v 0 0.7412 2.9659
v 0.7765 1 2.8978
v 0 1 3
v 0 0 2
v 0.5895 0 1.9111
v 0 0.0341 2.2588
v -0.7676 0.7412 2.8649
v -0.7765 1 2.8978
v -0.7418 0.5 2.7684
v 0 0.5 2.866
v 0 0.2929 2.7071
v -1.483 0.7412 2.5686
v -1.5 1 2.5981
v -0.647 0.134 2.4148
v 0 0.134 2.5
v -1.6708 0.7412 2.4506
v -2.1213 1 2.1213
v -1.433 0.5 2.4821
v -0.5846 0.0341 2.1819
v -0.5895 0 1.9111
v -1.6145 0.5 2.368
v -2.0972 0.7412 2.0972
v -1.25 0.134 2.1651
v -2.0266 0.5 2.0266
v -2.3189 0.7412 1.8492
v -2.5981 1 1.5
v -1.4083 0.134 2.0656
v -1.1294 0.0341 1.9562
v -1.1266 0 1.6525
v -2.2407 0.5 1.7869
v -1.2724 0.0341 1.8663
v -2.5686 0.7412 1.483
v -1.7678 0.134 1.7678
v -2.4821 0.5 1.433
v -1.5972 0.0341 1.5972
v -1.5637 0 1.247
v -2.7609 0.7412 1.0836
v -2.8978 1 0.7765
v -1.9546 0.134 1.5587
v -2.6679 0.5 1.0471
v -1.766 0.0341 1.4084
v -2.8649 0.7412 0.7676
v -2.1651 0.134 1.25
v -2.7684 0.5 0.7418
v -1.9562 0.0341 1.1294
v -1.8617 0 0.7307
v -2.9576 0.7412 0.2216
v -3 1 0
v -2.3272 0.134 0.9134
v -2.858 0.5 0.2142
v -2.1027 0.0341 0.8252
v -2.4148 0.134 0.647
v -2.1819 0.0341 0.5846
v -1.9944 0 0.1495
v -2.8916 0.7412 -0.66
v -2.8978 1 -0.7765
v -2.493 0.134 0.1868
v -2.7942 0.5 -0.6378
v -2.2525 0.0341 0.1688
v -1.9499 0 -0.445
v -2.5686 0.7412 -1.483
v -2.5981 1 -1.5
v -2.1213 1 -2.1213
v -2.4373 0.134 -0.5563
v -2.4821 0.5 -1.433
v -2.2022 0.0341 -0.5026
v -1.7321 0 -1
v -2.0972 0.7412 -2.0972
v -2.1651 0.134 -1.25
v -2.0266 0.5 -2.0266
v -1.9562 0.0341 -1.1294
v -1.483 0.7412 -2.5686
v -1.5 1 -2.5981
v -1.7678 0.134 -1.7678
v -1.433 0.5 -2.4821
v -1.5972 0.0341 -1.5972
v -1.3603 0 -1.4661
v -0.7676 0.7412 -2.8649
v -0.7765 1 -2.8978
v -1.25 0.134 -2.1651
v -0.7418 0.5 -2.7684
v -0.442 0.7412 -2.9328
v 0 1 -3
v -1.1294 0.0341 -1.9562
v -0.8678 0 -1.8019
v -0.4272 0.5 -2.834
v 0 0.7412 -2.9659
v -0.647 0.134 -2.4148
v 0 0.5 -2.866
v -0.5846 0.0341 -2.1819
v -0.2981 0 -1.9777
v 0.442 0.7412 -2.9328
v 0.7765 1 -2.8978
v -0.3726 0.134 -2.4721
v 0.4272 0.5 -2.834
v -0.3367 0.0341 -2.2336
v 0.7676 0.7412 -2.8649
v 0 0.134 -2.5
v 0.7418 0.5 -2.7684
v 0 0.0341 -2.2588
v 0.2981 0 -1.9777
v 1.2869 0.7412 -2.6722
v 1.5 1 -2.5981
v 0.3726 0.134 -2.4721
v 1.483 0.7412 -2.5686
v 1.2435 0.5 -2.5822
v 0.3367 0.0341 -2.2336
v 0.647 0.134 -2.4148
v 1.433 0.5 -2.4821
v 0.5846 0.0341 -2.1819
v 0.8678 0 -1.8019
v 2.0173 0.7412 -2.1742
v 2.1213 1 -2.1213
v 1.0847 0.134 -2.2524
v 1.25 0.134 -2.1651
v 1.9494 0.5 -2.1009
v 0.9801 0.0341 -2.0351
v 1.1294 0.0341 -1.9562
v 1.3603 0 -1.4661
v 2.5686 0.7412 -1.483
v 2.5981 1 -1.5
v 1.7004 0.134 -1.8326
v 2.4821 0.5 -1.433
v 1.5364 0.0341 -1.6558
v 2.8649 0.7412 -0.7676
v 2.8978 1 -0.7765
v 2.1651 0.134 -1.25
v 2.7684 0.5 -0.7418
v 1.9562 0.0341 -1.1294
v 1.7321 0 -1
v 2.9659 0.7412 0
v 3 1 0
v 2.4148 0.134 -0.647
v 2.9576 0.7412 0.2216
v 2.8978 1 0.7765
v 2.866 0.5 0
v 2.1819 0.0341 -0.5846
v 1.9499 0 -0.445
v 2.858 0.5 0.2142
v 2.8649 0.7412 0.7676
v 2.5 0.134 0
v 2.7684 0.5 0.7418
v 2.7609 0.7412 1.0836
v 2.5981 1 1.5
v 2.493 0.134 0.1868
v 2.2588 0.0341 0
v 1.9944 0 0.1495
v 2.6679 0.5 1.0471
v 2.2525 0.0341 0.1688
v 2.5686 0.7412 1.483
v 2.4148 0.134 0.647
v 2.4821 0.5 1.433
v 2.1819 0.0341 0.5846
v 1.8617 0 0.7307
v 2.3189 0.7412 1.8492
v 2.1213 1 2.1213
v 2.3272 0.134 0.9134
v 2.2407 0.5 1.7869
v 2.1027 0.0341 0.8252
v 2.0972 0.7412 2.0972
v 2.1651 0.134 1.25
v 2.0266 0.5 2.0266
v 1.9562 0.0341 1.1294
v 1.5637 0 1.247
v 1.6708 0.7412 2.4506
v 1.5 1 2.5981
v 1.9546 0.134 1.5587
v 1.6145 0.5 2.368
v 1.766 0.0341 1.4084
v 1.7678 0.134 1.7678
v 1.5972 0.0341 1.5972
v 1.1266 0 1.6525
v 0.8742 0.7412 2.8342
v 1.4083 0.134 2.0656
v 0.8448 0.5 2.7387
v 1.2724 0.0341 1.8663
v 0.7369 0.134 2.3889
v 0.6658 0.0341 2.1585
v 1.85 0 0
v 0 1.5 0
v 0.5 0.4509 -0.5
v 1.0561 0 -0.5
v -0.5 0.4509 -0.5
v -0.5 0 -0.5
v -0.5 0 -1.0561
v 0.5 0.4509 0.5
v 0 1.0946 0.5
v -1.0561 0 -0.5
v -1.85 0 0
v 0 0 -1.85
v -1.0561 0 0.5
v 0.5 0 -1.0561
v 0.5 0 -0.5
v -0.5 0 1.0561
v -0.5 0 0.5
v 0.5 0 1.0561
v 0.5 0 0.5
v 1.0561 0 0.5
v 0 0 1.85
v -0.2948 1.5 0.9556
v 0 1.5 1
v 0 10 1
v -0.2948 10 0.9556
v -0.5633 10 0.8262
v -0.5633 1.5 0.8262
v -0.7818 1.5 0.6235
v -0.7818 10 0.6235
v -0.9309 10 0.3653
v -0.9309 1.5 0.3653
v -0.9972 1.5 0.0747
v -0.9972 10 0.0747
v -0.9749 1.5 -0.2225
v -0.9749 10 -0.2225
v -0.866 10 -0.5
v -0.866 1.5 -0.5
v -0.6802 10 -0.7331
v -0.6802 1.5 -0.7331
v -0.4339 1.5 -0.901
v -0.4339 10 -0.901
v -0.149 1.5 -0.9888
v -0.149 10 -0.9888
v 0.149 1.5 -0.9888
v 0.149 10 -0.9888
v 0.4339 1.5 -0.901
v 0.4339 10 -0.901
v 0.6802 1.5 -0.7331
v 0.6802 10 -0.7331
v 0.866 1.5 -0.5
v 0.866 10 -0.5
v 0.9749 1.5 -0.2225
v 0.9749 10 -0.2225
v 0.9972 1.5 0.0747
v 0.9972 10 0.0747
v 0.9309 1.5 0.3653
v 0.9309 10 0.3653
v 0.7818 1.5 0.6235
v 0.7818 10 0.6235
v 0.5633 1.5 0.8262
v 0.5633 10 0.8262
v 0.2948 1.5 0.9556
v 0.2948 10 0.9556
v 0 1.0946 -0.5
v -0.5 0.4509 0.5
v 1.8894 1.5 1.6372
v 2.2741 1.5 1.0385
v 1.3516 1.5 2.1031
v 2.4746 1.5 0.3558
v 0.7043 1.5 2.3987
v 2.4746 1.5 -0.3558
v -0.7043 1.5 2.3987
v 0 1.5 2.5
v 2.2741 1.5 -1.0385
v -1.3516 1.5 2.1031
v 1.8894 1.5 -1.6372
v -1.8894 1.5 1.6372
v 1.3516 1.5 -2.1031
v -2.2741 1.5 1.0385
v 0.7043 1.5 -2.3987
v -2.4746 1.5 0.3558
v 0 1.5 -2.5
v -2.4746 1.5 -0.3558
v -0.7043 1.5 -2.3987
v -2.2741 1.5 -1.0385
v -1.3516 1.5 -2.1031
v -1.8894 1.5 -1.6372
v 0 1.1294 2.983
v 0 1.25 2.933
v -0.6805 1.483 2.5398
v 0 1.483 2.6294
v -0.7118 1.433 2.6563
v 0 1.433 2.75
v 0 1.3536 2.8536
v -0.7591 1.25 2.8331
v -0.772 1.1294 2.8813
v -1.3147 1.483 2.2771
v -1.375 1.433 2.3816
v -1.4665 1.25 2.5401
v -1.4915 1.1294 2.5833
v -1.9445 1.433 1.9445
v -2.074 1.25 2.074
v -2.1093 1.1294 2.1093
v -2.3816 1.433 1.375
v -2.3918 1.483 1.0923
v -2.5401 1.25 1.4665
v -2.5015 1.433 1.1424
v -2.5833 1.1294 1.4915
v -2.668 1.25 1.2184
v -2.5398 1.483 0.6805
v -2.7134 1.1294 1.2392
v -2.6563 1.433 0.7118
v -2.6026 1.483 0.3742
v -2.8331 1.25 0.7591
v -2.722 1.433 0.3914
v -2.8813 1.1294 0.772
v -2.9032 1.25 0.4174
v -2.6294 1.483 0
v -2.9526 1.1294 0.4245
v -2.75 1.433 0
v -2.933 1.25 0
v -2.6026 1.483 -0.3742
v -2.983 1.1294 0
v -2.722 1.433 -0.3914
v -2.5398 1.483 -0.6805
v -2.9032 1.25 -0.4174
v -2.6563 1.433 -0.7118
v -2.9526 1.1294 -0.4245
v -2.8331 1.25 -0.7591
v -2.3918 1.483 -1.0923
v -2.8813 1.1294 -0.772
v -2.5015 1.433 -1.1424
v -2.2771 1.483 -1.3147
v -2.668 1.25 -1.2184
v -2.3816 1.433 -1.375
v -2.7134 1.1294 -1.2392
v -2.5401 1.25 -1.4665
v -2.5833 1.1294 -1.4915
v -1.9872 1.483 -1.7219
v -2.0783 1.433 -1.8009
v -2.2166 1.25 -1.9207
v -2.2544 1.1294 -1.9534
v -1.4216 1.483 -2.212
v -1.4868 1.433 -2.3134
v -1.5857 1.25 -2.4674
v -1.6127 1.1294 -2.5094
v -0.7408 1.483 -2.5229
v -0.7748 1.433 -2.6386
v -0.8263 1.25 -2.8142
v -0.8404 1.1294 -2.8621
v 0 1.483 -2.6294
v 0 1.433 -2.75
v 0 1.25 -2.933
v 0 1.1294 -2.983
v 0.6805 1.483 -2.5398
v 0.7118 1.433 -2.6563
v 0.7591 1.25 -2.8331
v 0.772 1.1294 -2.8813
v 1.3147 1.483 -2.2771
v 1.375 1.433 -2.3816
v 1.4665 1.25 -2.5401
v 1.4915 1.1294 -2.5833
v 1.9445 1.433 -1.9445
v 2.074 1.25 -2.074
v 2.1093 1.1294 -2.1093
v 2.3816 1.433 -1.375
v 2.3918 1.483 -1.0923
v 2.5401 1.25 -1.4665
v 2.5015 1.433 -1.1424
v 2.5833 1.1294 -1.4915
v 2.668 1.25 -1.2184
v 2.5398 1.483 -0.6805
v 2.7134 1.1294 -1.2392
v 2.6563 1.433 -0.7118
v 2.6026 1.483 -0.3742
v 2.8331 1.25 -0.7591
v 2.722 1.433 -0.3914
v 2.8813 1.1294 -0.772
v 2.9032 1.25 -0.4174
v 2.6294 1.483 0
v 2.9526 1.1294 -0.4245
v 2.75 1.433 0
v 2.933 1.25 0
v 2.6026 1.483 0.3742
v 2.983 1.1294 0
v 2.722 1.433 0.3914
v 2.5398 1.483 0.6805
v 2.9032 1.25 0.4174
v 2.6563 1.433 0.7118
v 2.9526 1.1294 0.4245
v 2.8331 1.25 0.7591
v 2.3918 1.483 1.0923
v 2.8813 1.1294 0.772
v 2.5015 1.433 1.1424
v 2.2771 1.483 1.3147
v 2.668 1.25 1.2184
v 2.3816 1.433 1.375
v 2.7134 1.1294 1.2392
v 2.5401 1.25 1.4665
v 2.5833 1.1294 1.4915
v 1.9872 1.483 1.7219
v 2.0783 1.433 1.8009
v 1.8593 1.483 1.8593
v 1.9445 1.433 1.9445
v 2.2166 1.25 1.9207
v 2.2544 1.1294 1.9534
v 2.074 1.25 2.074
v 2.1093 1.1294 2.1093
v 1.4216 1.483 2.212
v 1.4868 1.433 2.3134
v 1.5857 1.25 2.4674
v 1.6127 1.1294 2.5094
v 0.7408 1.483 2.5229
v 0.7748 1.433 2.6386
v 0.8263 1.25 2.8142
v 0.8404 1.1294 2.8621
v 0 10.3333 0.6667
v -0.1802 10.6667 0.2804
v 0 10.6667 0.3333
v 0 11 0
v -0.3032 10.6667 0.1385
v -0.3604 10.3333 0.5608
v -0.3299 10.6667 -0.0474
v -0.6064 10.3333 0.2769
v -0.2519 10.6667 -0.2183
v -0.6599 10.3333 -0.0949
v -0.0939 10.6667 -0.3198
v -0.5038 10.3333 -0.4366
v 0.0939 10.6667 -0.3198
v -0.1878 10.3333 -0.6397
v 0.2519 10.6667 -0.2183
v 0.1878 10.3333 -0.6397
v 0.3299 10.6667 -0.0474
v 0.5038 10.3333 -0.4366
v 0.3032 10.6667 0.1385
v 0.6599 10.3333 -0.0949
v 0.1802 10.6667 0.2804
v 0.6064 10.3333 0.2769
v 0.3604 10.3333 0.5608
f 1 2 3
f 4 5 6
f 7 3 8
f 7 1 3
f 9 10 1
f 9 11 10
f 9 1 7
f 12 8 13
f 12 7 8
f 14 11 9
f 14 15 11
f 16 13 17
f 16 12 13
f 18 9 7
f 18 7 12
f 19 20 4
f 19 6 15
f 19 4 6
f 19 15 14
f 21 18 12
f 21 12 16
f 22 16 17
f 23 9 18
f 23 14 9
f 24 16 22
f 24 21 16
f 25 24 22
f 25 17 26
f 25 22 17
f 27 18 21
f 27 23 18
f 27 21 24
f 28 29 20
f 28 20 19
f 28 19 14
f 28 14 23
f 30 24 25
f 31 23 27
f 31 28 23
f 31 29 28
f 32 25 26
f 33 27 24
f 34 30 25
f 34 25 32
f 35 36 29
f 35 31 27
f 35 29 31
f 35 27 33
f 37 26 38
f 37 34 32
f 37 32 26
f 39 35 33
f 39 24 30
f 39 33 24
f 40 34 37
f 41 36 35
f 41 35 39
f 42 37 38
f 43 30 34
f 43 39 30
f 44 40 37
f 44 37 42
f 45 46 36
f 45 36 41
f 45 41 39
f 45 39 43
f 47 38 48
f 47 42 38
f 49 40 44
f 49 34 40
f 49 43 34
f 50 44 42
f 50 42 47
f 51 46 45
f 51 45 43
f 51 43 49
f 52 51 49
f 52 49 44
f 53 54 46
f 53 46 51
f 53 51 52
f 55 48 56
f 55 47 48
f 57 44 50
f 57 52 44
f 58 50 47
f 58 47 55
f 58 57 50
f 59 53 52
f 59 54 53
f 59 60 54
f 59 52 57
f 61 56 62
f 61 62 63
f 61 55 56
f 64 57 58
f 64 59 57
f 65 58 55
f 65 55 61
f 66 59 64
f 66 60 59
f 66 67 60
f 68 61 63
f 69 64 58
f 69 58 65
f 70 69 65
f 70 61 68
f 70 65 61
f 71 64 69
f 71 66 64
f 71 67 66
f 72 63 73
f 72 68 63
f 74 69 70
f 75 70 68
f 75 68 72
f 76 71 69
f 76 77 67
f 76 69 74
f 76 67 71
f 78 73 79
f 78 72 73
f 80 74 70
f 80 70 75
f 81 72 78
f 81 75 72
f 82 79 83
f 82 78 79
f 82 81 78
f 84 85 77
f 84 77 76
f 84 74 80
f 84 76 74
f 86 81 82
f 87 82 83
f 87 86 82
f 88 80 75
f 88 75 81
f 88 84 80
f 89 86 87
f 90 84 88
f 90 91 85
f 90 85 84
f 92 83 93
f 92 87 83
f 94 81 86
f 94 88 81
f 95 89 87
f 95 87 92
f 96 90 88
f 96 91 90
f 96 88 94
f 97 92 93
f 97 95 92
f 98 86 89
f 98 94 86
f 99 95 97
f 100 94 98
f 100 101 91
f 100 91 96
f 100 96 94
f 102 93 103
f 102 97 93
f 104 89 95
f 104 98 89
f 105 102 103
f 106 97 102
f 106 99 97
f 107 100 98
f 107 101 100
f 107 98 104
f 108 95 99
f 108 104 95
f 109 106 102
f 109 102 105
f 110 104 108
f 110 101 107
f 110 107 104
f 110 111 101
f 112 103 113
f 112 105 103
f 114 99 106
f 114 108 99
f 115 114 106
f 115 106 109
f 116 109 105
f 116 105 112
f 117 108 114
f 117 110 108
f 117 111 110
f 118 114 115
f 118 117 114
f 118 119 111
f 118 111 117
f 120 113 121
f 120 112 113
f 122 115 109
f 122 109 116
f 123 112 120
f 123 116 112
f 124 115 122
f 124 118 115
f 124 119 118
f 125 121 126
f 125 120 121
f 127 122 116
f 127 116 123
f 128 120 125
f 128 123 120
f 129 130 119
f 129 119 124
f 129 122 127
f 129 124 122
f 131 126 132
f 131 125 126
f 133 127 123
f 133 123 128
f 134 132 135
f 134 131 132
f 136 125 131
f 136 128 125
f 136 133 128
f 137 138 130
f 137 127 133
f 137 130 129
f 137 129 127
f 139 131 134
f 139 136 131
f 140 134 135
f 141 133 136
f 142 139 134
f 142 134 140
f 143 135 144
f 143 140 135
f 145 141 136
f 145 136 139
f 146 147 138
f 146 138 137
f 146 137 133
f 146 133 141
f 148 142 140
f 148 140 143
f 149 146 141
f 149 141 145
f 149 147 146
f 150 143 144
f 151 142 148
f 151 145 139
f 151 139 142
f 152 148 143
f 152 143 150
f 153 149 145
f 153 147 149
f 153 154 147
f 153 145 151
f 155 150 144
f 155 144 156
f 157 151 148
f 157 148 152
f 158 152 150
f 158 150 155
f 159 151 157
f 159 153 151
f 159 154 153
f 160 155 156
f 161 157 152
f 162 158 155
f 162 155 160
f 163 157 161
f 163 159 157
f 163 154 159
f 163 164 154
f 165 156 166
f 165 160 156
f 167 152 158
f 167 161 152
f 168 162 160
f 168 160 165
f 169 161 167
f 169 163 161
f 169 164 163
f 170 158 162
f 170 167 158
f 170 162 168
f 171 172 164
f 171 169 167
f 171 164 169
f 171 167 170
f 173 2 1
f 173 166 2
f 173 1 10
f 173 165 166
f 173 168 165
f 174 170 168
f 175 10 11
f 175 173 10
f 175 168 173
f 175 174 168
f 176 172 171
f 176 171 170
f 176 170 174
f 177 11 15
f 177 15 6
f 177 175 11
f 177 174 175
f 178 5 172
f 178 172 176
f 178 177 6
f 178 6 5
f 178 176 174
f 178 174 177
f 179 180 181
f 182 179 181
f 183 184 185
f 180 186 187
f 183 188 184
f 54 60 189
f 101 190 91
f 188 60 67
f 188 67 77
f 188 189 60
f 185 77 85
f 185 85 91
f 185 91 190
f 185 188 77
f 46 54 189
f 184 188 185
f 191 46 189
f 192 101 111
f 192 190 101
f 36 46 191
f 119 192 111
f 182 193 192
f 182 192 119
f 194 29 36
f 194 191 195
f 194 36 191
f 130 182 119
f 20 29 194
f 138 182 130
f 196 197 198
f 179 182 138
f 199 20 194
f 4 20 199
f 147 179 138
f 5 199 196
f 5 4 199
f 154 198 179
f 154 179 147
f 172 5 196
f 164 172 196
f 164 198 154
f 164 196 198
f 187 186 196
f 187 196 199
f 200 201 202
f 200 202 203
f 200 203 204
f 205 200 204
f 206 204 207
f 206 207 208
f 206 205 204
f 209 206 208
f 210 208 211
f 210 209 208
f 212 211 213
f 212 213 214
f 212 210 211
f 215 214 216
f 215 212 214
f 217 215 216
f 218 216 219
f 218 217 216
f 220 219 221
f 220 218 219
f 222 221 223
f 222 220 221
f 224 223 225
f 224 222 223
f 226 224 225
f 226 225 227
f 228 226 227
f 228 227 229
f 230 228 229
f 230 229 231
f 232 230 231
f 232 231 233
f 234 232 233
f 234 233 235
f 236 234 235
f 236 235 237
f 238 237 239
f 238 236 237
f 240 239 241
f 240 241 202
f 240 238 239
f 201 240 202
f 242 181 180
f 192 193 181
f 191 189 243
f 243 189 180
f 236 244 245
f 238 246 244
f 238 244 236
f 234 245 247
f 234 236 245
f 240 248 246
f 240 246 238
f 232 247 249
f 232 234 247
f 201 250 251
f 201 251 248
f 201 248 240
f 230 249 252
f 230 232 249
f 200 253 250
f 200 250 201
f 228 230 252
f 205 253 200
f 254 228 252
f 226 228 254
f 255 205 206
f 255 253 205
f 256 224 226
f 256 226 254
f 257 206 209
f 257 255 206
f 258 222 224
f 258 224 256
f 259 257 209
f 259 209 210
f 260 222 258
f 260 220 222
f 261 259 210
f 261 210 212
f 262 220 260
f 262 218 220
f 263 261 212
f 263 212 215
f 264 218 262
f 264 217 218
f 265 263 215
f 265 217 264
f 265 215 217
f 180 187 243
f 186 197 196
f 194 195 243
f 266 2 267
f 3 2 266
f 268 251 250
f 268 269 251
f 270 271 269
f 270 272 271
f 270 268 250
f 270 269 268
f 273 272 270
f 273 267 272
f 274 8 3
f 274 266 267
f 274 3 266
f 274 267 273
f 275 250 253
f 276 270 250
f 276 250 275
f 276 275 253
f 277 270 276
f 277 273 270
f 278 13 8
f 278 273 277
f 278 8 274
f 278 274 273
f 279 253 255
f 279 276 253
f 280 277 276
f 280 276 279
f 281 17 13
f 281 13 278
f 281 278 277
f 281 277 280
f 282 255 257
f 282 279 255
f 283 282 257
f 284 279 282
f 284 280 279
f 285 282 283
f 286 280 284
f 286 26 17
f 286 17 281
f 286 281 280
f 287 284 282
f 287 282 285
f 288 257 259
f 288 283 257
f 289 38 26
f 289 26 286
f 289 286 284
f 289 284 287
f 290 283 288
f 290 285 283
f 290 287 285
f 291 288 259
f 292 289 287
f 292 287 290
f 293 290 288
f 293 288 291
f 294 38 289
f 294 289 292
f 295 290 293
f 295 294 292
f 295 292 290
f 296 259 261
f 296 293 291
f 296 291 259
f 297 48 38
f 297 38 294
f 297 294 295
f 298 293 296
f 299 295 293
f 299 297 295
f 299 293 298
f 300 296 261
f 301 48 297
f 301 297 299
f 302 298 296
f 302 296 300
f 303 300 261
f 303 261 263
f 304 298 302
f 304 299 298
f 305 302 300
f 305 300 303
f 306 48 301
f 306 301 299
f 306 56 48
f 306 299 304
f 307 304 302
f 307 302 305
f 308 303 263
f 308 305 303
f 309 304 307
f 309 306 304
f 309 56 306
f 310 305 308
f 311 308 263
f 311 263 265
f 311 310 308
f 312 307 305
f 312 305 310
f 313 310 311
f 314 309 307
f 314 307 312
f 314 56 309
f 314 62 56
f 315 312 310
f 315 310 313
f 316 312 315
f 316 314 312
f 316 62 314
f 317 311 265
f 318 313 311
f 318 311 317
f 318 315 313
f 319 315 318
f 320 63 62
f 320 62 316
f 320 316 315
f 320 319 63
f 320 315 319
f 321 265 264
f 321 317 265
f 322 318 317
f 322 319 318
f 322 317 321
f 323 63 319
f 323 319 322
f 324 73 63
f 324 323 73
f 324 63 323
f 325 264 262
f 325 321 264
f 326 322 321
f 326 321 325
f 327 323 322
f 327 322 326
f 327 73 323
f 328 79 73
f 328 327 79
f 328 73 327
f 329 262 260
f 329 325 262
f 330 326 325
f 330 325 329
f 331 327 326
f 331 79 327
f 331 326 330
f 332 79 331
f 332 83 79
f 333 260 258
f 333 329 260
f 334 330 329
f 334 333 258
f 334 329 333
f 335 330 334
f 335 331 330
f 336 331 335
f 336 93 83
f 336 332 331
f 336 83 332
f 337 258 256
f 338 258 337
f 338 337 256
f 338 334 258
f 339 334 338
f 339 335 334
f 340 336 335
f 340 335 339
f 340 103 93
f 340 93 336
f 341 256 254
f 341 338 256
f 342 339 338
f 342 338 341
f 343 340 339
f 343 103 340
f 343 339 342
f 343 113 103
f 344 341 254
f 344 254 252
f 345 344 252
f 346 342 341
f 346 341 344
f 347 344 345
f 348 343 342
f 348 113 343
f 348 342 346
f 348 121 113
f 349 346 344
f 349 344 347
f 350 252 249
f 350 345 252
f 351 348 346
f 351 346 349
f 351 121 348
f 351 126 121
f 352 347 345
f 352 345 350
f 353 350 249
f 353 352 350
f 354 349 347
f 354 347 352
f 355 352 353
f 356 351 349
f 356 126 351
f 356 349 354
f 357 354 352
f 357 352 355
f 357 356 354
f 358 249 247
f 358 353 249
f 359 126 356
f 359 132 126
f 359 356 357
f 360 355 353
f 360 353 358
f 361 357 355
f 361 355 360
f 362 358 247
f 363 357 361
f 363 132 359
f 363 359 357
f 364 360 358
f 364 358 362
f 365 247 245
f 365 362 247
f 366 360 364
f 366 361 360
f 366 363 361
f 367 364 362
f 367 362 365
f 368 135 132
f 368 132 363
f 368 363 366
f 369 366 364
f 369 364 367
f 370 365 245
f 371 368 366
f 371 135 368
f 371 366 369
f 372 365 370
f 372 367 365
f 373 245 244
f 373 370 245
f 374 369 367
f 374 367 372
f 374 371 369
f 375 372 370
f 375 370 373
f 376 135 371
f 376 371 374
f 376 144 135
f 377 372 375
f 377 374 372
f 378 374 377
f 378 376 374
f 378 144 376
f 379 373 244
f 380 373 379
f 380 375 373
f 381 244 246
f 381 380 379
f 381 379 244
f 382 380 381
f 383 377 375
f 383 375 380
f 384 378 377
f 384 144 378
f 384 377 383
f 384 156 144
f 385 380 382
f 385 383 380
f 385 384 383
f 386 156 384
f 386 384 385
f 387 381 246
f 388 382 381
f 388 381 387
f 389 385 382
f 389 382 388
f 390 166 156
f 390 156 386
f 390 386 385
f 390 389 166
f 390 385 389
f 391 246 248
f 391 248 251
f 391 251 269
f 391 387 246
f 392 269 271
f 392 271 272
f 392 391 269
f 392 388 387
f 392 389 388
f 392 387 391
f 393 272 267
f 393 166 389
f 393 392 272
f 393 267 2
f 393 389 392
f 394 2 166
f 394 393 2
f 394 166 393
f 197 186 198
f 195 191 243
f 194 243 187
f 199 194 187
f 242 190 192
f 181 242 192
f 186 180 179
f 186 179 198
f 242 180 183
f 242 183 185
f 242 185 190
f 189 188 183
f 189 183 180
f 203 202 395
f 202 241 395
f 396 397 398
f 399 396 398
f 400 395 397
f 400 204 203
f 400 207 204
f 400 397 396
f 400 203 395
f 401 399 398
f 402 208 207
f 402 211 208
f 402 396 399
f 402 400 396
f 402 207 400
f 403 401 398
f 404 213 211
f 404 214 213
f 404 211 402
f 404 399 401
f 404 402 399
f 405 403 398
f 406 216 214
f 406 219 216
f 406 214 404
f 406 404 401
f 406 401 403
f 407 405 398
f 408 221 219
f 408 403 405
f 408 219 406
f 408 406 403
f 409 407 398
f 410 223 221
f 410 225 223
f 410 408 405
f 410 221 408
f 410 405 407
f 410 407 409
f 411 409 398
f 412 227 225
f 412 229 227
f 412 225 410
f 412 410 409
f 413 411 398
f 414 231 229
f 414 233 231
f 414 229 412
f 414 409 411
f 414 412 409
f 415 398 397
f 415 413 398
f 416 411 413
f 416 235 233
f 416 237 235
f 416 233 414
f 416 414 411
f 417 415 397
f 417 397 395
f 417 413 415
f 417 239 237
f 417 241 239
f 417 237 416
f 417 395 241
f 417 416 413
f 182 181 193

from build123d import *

# Parameters (mm, degrees)
F2_SIZE      = 1
F4_DEPTH     = 0.5
F5_T4_DEPTH  = 4.9533840607
F5_T10_DEPTH = 4.9533840607
F5_T16_DEPTH = 4.9533840607
F5_T22_DEPTH = 4.9533840607
F7_DEPTH     = 0.5
F8_T4_DEPTH  = 4.9533840607
F8_T10_DEPTH = 4.9533840607
F8_T16_DEPTH = 4.9533840607
F8_T22_DEPTH = 4.9533840607
F8_T28_DEPTH = 4.9533840607
F8_T34_DEPTH = 4.9533840607
F8_T40_DEPTH = 4.9533840607
F8_T46_DEPTH = 4.9533840607


# Not quite as in the source:
# - a fillet or chamfer that OpenCascade refuses, or shapes differently, is made with other operations: its cross-section is extruded or revolved along the edge and cut away or added


with BuildPart() as f1:
    # F0 (on Right) → F1 (revolve)
    with BuildSketch(Plane.YZ):
        with BuildLine():
            Line((0, 2), (0, 0))
            Line((0, 0), (11, 0))
            Line((11, 0), (11, 1))
            Line((11, 1), (1.5, 1))
            Line((1.5, 1), (1.5, 2.5))
            ThreePointArc((1.5, 2.5), (1.3535533906, 2.8535533906), (1, 3))
            ThreePointArc((1, 3), (0.2928932188, 2.7071067812), (0, 2))
        make_face()
    revolve(axis=Axis((0, -4.3078260496, 0), (0, -1, 0)))

    # F2
    f2_edges = [f1.edges().sort_by_distance(p)[0] for p in [
        (0, 11, -1),
    ]]
    chamfer(f2_edges, length=F2_SIZE)

    # F3 (on Right) → F4 (cut, symmetric)
    with BuildSketch(Plane.YZ):
        Polygon((1.5, 0), (0, 1.85), (0, -1.85), align=None)
    extrude(amount=F4_DEPTH, both=True, mode=Mode.SUBTRACT)

    # F5: chamfer of 0.5 on 4 edges, made by hand


with BuildPart() as f5_tool2:
    # F5_s3 → F5_t4 (new body)
    with BuildSketch(Plane(origin=(0, -1.7148497309, -2.1149813348), x_dir=(1, 0, 0), z_dir=(0, 0.6298019584, 0.7767557487))):
        Polygon((0, 1.1651336231), (0.5, 0.6651336231), (0.5, 1.1651336231), align=None)
    extrude(amount=F5_T4_DEPTH)

    split(bisect_by=Plane.XZ, keep=Keep.BOTTOM)

    split(bisect_by=Plane(origin=(0, 0.9050242398, 0.7338034376), x_dir=(1, 0, 0), z_dir=(0, -0.7767557487, -0.6298019584)), keep=Keep.TOP)


with BuildPart() as f1_1:
    add(f1.part)

    # F5_t1: union F5_tool2
    add(f5_tool2.part)


with BuildPart() as f5_tool8:
    # F5_s9 → F5_t10 (new body)
    with BuildSketch(Plane(origin=(0, -1.7148497309, -2.1149813348), x_dir=(1, 0, 0), z_dir=(0, 0.6298019584, 0.7767557487))):
        Polygon((-0.5, 0.6651336231), (0, 1.1651336231), (-0.5, 1.1651336231), align=None)
    extrude(amount=F5_T10_DEPTH)

    split(bisect_by=Plane.XZ, keep=Keep.BOTTOM)

    split(bisect_by=Plane(origin=(0, 0.9050242398, 0.7338034376), x_dir=(1, 0, 0), z_dir=(0, -0.7767557487, -0.6298019584)), keep=Keep.TOP)


with BuildPart() as f1_2:
    add(f1_1.part)

    # F5_t7: union F5_tool8
    add(f5_tool8.part)


with BuildPart() as f5_tool14:
    # F5_s15 → F5_t16 (new body)
    with BuildSketch(Plane(origin=(0, 1.4048012514, -1.73258821), x_dir=(1, 0, 0), z_dir=(0, -0.6298019584, 0.7767557487))):
        Polygon((-0.5, 0.6651336231), (0, 1.1651336231), (-0.5, 1.1651336231), align=None)
    extrude(amount=F5_T16_DEPTH)

    split(bisect_by=Plane.XZ, keep=Keep.BOTTOM)

    split(bisect_by=Plane(origin=(0, 0.9050242398, -0.7338034376), x_dir=(1, 0, 0), z_dir=(0, -0.7767557487, 0.6298019584)), keep=Keep.TOP)


with BuildPart() as f1_3:
    add(f1_2.part)

    # F5_t13: union F5_tool14
    add(f5_tool14.part)


with BuildPart() as f5_tool20:
    # F5_s21 → F5_t22 (new body)
    with BuildSketch(Plane(origin=(0, 1.4048012514, -1.73258821), x_dir=(1, 0, 0), z_dir=(0, -0.6298019584, 0.7767557487))):
        Polygon((0.5, 0.6651336231), (0, 1.1651336231), (0.5, 1.1651336231), align=None)
    extrude(amount=F5_T22_DEPTH)

    split(bisect_by=Plane.XZ, keep=Keep.BOTTOM)

    split(bisect_by=Plane(origin=(0, 0.9050242398, -0.7338034376), x_dir=(1, 0, 0), z_dir=(0, -0.7767557487, 0.6298019584)), keep=Keep.TOP)


with BuildPart() as f1_4:
    add(f1_3.part)

    # F5_t19: union F5_tool20
    add(f5_tool20.part)

    # F6 (on Top) → F7 (cut, symmetric)
    with BuildSketch(Plane.XY):
        Polygon((0, 1.5), (-1.85, 0), (1.85, 0), align=None)
    extrude(amount=F7_DEPTH, both=True, mode=Mode.SUBTRACT)

    # F8: chamfer of 0.5 on 4 edges, made by hand


with BuildPart() as f8_tool2:
    # F8_s3 → F8_t4 (new body)
    with BuildSketch(Plane(origin=(2.1149813348, -1.7148497309, 0), x_dir=(0, 0, 1), z_dir=(-0.7767557487, 0.6298019584, 0))):
        Polygon((0, 1.1651336231), (-0.5, 0.6651336231), (-0.5, 1.1651336231), align=None)
    extrude(amount=F8_T4_DEPTH)

    split(bisect_by=Plane.XZ, keep=Keep.BOTTOM)

    split(bisect_by=Plane(origin=(0.5825668116, 0.4525121199, -0.3669017188), x_dir=(-0.6134375783, 0.7897432099, 0), z_dir=(0.7071067812, 0.5492492572, -0.4453372356)), keep=Keep.TOP)


with BuildPart() as f1_5:
    add(f1_4.part)

    # F8_t1: union F8_tool2
    add(f8_tool2.part)


with BuildPart() as f8_tool8:
    # F8_s9 → F8_t10 (new body)
    with BuildSketch(Plane(origin=(2.1149813348, -1.7148497309, 0), x_dir=(0, 0, 1), z_dir=(-0.7767557487, 0.6298019584, 0))):
        Polygon((0, 1.1651336231), (-0.5, 0.6651336231), (-0.5, 1.1651336231), align=None)
    extrude(amount=F8_T10_DEPTH)

    split(bisect_by=Plane(origin=(-0.5825668116, 0.4525121199, -0.3669017188), x_dir=(-0.6134375783, -0.7897432099, 0), z_dir=(-0.7071067812, 0.5492492572, -0.4453372356)), keep=Keep.TOP)

    split(bisect_by=Plane(origin=(-0.7338034376, 0.9050242398, 0), x_dir=(0, 0, 1), z_dir=(0.6298019584, -0.7767557487, 0)), keep=Keep.TOP)


with BuildPart() as f1_6:
    add(f1_5.part)

    # F8_t7: union F8_tool8
    add(f8_tool8.part)


with BuildPart() as f8_tool14:
    # F8_s15 → F8_t16 (new body)
    with BuildSketch(Plane(origin=(1.73258821, 1.4048012514, 0), x_dir=(0, 0, 1), z_dir=(-0.7767557487, -0.6298019584, 0))):
        Polygon((-0.5, 0.6651336231), (0, 1.1651336231), (-0.5, 1.1651336231), align=None)
    extrude(amount=F8_T16_DEPTH)

    split(bisect_by=Plane(origin=(0.7338034376, 0.9050242398, 0), x_dir=(0, 0, 1), z_dir=(-0.6298019584, -0.7767557487, 0)), keep=Keep.TOP)

    split(bisect_by=Plane(origin=(0.5825668116, 0.4525121199, -0.3669017188), x_dir=(-0.6134375783, 0.7897432099, 0), z_dir=(0.7071067812, 0.5492492572, -0.4453372356)), keep=Keep.TOP)


with BuildPart() as f1_7:
    add(f1_6.part)

    # F8_t13: union F8_tool14
    add(f8_tool14.part)


with BuildPart() as f8_tool20:
    # F8_s21 → F8_t22 (new body)
    with BuildSketch(Plane(origin=(1.73258821, 1.4048012514, 0), x_dir=(0, 0, 1), z_dir=(-0.7767557487, -0.6298019584, 0))):
        Polygon((-0.5, 0.6651336231), (0, 1.1651336231), (-0.5, 1.1651336231), align=None)
    extrude(amount=F8_T22_DEPTH)

    split(bisect_by=Plane.XZ, keep=Keep.BOTTOM)

    split(bisect_by=Plane(origin=(-0.5825668116, 0.4525121199, -0.3669017188), x_dir=(-0.6134375783, -0.7897432099, 0), z_dir=(-0.7071067812, 0.5492492572, -0.4453372356)), keep=Keep.TOP)


with BuildPart() as f1_8:
    add(f1_7.part)

    # F8_t19: union F8_tool20
    add(f8_tool20.part)


with BuildPart() as f8_tool26:
    # F8_s27 → F8_t28 (new body)
    with BuildSketch(Plane(origin=(2.1149813348, -1.7148497309, 0), x_dir=(0, 0, 1), z_dir=(-0.7767557487, 0.6298019584, 0))):
        Polygon((0, 1.1651336231), (0.5, 0.6651336231), (0.5, 1.1651336231), align=None)
    extrude(amount=F8_T28_DEPTH)

    split(bisect_by=Plane.XZ, keep=Keep.BOTTOM)

    split(bisect_by=Plane(origin=(0.5825668116, 0.4525121199, 0.3669017188), x_dir=(-0.6134375783, 0.7897432099, 0), z_dir=(0.7071067812, 0.5492492572, 0.4453372356)), keep=Keep.TOP)


with BuildPart() as f1_9:
    add(f1_8.part)

    # F8_t25: union F8_tool26
    add(f8_tool26.part)


with BuildPart() as f8_tool32:
    # F8_s33 → F8_t34 (new body)
    with BuildSketch(Plane(origin=(2.1149813348, -1.7148497309, 0), x_dir=(0, 0, 1), z_dir=(-0.7767557487, 0.6298019584, 0))):
        Polygon((0, 1.1651336231), (0.5, 0.6651336231), (0.5, 1.1651336231), align=None)
    extrude(amount=F8_T34_DEPTH)

    split(bisect_by=Plane(origin=(-0.5825668116, 0.4525121199, 0.3669017188), x_dir=(-0.6134375783, -0.7897432099, 0), z_dir=(-0.7071067812, 0.5492492572, 0.4453372356)), keep=Keep.TOP)

    split(bisect_by=Plane(origin=(-0.7338034376, 0.9050242398, 0), x_dir=(0, 0, 1), z_dir=(0.6298019584, -0.7767557487, 0)), keep=Keep.TOP)


with BuildPart() as f1_10:
    add(f1_9.part)

    # F8_t31: union F8_tool32
    add(f8_tool32.part)


with BuildPart() as f8_tool38:
    # F8_s39 → F8_t40 (new body)
    with BuildSketch(Plane(origin=(1.73258821, 1.4048012514, 0), x_dir=(0, 0, 1), z_dir=(-0.7767557487, -0.6298019584, 0))):
        Polygon((0, 1.1651336231), (0.5, 0.6651336231), (0.5, 1.1651336231), align=None)
    extrude(amount=F8_T40_DEPTH)

    split(bisect_by=Plane(origin=(0.5825668116, 0.4525121199, 0.3669017188), x_dir=(-0.6134375783, 0.7897432099, 0), z_dir=(0.7071067812, 0.5492492572, 0.4453372356)), keep=Keep.TOP)

    split(bisect_by=Plane(origin=(0.7338034376, 0.9050242398, 0), x_dir=(0, 0, 1), z_dir=(-0.6298019584, -0.7767557487, 0)), keep=Keep.TOP)


with BuildPart() as f1_11:
    add(f1_10.part)

    # F8_t37: union F8_tool38
    add(f8_tool38.part)


with BuildPart() as f8_tool44:
    # F8_s45 → F8_t46 (new body)
    with BuildSketch(Plane(origin=(1.73258821, 1.4048012514, 0), x_dir=(0, 0, 1), z_dir=(-0.7767557487, -0.6298019584, 0))):
        Polygon((0, 1.1651336231), (0.5, 0.6651336231), (0.5, 1.1651336231), align=None)
    extrude(amount=F8_T46_DEPTH)

    split(bisect_by=Plane.XZ, keep=Keep.BOTTOM)

    split(bisect_by=Plane(origin=(-0.5825668116, 0.4525121199, 0.3669017188), x_dir=(-0.6134375783, -0.7897432099, 0), z_dir=(-0.7071067812, 0.5492492572, 0.4453372356)), keep=Keep.TOP)


with BuildPart() as f1_12:
    add(f1_11.part)

    # F8_t43: union F8_tool44
    add(f8_tool44.part)


solid = f1_12.part
